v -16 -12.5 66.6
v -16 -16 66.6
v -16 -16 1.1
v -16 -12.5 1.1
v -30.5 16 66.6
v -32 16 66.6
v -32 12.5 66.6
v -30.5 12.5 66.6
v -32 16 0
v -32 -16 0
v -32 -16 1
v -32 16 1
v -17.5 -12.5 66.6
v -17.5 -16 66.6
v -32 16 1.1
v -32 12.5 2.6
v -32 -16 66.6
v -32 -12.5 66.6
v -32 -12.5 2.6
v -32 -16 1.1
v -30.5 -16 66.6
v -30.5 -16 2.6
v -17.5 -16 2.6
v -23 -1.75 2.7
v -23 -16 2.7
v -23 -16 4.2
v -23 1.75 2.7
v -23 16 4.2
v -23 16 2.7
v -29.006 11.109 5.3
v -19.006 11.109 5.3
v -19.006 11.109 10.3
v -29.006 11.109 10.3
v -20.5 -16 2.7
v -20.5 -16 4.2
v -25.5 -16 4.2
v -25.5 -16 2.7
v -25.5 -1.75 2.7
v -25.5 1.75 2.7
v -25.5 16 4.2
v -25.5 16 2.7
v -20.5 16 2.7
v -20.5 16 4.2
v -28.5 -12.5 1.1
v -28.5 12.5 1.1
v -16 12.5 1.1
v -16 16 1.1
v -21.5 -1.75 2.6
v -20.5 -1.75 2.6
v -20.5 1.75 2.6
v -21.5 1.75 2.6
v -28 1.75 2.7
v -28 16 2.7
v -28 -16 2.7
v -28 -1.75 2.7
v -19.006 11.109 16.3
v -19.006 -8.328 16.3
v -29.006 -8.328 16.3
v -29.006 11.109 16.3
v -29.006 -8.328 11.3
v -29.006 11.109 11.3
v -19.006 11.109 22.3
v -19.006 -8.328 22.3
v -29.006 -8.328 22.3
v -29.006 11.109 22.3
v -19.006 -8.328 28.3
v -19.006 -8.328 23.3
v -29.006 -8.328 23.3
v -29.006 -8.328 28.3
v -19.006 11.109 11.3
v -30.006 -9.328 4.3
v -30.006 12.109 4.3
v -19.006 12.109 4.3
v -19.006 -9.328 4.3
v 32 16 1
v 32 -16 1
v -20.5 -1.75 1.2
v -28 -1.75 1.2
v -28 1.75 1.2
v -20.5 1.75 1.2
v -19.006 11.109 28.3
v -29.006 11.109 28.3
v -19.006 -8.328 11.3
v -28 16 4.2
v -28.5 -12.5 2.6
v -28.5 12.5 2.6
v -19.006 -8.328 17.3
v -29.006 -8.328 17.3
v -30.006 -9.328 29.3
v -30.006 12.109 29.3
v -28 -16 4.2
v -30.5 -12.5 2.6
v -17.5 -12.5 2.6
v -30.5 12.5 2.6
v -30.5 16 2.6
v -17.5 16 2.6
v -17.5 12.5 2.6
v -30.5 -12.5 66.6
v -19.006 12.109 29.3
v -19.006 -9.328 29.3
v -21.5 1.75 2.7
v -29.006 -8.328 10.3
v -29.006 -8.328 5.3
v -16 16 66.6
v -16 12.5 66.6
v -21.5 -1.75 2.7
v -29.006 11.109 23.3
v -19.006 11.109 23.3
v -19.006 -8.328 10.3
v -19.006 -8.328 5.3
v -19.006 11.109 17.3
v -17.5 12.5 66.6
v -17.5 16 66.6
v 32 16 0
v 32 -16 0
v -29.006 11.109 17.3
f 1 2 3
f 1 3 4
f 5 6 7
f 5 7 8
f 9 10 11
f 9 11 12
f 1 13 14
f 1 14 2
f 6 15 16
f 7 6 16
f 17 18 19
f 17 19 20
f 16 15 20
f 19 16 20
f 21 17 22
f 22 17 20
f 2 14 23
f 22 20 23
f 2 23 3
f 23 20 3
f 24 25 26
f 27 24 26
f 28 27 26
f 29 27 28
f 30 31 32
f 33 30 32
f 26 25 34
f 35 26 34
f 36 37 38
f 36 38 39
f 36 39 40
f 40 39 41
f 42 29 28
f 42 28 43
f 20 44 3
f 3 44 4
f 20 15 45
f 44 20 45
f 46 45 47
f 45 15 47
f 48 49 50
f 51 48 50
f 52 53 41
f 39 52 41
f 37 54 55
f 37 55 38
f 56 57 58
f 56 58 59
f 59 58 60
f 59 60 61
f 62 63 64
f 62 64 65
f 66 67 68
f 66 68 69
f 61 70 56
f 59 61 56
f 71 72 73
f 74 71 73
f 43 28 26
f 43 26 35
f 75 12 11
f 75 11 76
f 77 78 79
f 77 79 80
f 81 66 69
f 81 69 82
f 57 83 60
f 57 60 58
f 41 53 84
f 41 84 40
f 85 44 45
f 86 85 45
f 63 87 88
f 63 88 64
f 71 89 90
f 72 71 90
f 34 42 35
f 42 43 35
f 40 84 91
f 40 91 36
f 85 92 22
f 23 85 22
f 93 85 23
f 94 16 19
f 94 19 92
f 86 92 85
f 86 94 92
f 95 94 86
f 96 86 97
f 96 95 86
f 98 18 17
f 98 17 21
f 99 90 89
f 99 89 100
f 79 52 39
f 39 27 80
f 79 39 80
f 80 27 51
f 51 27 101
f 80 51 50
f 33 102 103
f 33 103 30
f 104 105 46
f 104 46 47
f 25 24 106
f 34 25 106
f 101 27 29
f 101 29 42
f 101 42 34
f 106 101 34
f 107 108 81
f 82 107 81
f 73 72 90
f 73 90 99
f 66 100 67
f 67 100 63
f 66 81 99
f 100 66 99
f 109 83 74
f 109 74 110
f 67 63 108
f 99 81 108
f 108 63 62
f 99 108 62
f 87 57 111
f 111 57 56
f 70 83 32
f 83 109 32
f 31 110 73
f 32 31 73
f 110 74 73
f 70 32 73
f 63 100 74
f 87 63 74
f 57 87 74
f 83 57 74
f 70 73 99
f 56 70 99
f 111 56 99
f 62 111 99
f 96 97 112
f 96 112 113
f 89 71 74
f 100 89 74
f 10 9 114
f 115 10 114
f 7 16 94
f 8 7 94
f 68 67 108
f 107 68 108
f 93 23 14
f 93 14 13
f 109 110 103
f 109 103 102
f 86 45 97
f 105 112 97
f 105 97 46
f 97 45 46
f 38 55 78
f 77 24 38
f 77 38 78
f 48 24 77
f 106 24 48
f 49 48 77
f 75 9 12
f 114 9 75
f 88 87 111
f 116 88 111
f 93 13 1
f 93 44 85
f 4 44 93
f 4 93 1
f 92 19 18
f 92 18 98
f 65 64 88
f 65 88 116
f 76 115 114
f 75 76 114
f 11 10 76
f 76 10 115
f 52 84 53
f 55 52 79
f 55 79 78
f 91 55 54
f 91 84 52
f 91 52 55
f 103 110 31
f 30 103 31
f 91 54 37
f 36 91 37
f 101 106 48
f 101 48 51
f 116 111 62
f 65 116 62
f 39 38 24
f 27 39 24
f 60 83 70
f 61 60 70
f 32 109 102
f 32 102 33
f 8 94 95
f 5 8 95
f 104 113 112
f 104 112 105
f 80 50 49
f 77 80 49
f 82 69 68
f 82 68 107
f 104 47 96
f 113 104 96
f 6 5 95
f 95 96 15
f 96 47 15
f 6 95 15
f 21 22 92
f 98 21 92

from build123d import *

# Parameters (mm, degrees)
F0_W      = 64
F0_H      = 32
F1_DEPTH  = 1
F4_DEPTH  = 1.5
F5_W      = 1.5
F5_H      = 3.5
F6_DEPTH  = 64
F8_W      = 2.5
F8_H      = 32
F9_DEPTH  = 1.5
F10_W     = 7.5
F10_H     = 3.5
F11_DEPTH = 1.5
F12_W     = 3.5
F12_H     = 0.1
F13_DEPTH = 1
F15_W     = 11
F15_H     = 21.4368455679
F16_DEPTH = 25
F17_W     = 19.4368455679
F17_H     = 5
F18_DEPTH = 10


with BuildPart() as f1:
    # F0 (on Top) → F1 (new body)
    with BuildSketch(Plane.XY):
        Rectangle(F0_W, F0_H)
    extrude(amount=F1_DEPTH)


with BuildPart() as f4:
    # F3 (on offset) → F4 (new body)
    with BuildSketch(Plane.XY.offset(1.1)):
        Polygon((-32, 16), (-32, -16), (-16, -16), (-16, -12.5), (-28.5, -12.5), (-28.5, 12.5), (-16, 12.5), (-16, 16), align=None)
    extrude(amount=F4_DEPTH)

    # F5 (on face) → F6 (join)
    with BuildSketch(Plane.XY.offset(2.6)):
        with Locations((-16.75, -14.25)):
            Rectangle(F5_W, F5_H)
        with Locations((-16.75, 14.25)):
            Rectangle(F5_W, F5_H)
        with Locations((-31.25, -14.25)):
            Rectangle(F5_W, F5_H)
        with Locations((-31.25, 14.25)):
            Rectangle(F5_W, F5_H)
    extrude(amount=F6_DEPTH)


with BuildPart() as f9:
    # F8 (on offset) → F9 (new body)
    with BuildSketch(Plane.XY.offset(2.7)):
        with Locations((-26.75, 0)):
            Rectangle(F8_W, F8_H)
    extrude(amount=F9_DEPTH)



with BuildPart() as f9b:
    # F8 (on offset) → F9, piece 2 (new body)
    with BuildSketch(Plane.XY.offset(2.7)):
        with Locations((-21.75, 0)):
            Rectangle(F8_W, F8_H)
    extrude(amount=F9_DEPTH)


with BuildPart() as f9_1:
    add(f9.part)

    add(f9b.part)  # F11 merges F9b
    # F10 (on face) → F11 (join)
    with BuildSketch(Plane(origin=(0, 0, 2.7), x_dir=(1, 0, 0), z_dir=(0, 0, -1))):
        with Locations((-24.25, 0)):
            Rectangle(F10_W, F10_H)
    extrude(amount=F11_DEPTH)

    # F12 (on face) → F13 (cut)
    with BuildSketch(Plane.YZ.offset(-20.5)):
        with Locations((0, 2.65)):
            Rectangle(F12_W, F12_H)
    extrude(amount=-F13_DEPTH, mode=Mode.SUBTRACT)


with BuildPart() as f16:
    # F15 (on offset) → F16 (new body)
    with BuildSketch(Plane.XY.offset(4.3)):
        with Locations((-24.5060836896, 1.3906531967)):
            Rectangle(F15_W, F15_H)
    extrude(amount=F16_DEPTH)

    # F17 (on face) → F18 (cut)
    with BuildSketch(Plane.YZ.offset(-19.0060836896)):
        with Locations((1.3906531967, 25.8)):
            Rectangle(F17_W, F17_H)
        with Locations((1.3906531967, 19.8)):
            Rectangle(F17_W, F17_H)
        with Locations((1.3906531967, 13.8)):
            Rectangle(F17_W, F17_H)
        with Locations((1.3906531967, 7.8)):
            Rectangle(F17_W, F17_H)
    extrude(amount=-F18_DEPTH, mode=Mode.SUBTRACT)


solid = Compound([f1.part, f4.part, f9_1.part, f16.part])
